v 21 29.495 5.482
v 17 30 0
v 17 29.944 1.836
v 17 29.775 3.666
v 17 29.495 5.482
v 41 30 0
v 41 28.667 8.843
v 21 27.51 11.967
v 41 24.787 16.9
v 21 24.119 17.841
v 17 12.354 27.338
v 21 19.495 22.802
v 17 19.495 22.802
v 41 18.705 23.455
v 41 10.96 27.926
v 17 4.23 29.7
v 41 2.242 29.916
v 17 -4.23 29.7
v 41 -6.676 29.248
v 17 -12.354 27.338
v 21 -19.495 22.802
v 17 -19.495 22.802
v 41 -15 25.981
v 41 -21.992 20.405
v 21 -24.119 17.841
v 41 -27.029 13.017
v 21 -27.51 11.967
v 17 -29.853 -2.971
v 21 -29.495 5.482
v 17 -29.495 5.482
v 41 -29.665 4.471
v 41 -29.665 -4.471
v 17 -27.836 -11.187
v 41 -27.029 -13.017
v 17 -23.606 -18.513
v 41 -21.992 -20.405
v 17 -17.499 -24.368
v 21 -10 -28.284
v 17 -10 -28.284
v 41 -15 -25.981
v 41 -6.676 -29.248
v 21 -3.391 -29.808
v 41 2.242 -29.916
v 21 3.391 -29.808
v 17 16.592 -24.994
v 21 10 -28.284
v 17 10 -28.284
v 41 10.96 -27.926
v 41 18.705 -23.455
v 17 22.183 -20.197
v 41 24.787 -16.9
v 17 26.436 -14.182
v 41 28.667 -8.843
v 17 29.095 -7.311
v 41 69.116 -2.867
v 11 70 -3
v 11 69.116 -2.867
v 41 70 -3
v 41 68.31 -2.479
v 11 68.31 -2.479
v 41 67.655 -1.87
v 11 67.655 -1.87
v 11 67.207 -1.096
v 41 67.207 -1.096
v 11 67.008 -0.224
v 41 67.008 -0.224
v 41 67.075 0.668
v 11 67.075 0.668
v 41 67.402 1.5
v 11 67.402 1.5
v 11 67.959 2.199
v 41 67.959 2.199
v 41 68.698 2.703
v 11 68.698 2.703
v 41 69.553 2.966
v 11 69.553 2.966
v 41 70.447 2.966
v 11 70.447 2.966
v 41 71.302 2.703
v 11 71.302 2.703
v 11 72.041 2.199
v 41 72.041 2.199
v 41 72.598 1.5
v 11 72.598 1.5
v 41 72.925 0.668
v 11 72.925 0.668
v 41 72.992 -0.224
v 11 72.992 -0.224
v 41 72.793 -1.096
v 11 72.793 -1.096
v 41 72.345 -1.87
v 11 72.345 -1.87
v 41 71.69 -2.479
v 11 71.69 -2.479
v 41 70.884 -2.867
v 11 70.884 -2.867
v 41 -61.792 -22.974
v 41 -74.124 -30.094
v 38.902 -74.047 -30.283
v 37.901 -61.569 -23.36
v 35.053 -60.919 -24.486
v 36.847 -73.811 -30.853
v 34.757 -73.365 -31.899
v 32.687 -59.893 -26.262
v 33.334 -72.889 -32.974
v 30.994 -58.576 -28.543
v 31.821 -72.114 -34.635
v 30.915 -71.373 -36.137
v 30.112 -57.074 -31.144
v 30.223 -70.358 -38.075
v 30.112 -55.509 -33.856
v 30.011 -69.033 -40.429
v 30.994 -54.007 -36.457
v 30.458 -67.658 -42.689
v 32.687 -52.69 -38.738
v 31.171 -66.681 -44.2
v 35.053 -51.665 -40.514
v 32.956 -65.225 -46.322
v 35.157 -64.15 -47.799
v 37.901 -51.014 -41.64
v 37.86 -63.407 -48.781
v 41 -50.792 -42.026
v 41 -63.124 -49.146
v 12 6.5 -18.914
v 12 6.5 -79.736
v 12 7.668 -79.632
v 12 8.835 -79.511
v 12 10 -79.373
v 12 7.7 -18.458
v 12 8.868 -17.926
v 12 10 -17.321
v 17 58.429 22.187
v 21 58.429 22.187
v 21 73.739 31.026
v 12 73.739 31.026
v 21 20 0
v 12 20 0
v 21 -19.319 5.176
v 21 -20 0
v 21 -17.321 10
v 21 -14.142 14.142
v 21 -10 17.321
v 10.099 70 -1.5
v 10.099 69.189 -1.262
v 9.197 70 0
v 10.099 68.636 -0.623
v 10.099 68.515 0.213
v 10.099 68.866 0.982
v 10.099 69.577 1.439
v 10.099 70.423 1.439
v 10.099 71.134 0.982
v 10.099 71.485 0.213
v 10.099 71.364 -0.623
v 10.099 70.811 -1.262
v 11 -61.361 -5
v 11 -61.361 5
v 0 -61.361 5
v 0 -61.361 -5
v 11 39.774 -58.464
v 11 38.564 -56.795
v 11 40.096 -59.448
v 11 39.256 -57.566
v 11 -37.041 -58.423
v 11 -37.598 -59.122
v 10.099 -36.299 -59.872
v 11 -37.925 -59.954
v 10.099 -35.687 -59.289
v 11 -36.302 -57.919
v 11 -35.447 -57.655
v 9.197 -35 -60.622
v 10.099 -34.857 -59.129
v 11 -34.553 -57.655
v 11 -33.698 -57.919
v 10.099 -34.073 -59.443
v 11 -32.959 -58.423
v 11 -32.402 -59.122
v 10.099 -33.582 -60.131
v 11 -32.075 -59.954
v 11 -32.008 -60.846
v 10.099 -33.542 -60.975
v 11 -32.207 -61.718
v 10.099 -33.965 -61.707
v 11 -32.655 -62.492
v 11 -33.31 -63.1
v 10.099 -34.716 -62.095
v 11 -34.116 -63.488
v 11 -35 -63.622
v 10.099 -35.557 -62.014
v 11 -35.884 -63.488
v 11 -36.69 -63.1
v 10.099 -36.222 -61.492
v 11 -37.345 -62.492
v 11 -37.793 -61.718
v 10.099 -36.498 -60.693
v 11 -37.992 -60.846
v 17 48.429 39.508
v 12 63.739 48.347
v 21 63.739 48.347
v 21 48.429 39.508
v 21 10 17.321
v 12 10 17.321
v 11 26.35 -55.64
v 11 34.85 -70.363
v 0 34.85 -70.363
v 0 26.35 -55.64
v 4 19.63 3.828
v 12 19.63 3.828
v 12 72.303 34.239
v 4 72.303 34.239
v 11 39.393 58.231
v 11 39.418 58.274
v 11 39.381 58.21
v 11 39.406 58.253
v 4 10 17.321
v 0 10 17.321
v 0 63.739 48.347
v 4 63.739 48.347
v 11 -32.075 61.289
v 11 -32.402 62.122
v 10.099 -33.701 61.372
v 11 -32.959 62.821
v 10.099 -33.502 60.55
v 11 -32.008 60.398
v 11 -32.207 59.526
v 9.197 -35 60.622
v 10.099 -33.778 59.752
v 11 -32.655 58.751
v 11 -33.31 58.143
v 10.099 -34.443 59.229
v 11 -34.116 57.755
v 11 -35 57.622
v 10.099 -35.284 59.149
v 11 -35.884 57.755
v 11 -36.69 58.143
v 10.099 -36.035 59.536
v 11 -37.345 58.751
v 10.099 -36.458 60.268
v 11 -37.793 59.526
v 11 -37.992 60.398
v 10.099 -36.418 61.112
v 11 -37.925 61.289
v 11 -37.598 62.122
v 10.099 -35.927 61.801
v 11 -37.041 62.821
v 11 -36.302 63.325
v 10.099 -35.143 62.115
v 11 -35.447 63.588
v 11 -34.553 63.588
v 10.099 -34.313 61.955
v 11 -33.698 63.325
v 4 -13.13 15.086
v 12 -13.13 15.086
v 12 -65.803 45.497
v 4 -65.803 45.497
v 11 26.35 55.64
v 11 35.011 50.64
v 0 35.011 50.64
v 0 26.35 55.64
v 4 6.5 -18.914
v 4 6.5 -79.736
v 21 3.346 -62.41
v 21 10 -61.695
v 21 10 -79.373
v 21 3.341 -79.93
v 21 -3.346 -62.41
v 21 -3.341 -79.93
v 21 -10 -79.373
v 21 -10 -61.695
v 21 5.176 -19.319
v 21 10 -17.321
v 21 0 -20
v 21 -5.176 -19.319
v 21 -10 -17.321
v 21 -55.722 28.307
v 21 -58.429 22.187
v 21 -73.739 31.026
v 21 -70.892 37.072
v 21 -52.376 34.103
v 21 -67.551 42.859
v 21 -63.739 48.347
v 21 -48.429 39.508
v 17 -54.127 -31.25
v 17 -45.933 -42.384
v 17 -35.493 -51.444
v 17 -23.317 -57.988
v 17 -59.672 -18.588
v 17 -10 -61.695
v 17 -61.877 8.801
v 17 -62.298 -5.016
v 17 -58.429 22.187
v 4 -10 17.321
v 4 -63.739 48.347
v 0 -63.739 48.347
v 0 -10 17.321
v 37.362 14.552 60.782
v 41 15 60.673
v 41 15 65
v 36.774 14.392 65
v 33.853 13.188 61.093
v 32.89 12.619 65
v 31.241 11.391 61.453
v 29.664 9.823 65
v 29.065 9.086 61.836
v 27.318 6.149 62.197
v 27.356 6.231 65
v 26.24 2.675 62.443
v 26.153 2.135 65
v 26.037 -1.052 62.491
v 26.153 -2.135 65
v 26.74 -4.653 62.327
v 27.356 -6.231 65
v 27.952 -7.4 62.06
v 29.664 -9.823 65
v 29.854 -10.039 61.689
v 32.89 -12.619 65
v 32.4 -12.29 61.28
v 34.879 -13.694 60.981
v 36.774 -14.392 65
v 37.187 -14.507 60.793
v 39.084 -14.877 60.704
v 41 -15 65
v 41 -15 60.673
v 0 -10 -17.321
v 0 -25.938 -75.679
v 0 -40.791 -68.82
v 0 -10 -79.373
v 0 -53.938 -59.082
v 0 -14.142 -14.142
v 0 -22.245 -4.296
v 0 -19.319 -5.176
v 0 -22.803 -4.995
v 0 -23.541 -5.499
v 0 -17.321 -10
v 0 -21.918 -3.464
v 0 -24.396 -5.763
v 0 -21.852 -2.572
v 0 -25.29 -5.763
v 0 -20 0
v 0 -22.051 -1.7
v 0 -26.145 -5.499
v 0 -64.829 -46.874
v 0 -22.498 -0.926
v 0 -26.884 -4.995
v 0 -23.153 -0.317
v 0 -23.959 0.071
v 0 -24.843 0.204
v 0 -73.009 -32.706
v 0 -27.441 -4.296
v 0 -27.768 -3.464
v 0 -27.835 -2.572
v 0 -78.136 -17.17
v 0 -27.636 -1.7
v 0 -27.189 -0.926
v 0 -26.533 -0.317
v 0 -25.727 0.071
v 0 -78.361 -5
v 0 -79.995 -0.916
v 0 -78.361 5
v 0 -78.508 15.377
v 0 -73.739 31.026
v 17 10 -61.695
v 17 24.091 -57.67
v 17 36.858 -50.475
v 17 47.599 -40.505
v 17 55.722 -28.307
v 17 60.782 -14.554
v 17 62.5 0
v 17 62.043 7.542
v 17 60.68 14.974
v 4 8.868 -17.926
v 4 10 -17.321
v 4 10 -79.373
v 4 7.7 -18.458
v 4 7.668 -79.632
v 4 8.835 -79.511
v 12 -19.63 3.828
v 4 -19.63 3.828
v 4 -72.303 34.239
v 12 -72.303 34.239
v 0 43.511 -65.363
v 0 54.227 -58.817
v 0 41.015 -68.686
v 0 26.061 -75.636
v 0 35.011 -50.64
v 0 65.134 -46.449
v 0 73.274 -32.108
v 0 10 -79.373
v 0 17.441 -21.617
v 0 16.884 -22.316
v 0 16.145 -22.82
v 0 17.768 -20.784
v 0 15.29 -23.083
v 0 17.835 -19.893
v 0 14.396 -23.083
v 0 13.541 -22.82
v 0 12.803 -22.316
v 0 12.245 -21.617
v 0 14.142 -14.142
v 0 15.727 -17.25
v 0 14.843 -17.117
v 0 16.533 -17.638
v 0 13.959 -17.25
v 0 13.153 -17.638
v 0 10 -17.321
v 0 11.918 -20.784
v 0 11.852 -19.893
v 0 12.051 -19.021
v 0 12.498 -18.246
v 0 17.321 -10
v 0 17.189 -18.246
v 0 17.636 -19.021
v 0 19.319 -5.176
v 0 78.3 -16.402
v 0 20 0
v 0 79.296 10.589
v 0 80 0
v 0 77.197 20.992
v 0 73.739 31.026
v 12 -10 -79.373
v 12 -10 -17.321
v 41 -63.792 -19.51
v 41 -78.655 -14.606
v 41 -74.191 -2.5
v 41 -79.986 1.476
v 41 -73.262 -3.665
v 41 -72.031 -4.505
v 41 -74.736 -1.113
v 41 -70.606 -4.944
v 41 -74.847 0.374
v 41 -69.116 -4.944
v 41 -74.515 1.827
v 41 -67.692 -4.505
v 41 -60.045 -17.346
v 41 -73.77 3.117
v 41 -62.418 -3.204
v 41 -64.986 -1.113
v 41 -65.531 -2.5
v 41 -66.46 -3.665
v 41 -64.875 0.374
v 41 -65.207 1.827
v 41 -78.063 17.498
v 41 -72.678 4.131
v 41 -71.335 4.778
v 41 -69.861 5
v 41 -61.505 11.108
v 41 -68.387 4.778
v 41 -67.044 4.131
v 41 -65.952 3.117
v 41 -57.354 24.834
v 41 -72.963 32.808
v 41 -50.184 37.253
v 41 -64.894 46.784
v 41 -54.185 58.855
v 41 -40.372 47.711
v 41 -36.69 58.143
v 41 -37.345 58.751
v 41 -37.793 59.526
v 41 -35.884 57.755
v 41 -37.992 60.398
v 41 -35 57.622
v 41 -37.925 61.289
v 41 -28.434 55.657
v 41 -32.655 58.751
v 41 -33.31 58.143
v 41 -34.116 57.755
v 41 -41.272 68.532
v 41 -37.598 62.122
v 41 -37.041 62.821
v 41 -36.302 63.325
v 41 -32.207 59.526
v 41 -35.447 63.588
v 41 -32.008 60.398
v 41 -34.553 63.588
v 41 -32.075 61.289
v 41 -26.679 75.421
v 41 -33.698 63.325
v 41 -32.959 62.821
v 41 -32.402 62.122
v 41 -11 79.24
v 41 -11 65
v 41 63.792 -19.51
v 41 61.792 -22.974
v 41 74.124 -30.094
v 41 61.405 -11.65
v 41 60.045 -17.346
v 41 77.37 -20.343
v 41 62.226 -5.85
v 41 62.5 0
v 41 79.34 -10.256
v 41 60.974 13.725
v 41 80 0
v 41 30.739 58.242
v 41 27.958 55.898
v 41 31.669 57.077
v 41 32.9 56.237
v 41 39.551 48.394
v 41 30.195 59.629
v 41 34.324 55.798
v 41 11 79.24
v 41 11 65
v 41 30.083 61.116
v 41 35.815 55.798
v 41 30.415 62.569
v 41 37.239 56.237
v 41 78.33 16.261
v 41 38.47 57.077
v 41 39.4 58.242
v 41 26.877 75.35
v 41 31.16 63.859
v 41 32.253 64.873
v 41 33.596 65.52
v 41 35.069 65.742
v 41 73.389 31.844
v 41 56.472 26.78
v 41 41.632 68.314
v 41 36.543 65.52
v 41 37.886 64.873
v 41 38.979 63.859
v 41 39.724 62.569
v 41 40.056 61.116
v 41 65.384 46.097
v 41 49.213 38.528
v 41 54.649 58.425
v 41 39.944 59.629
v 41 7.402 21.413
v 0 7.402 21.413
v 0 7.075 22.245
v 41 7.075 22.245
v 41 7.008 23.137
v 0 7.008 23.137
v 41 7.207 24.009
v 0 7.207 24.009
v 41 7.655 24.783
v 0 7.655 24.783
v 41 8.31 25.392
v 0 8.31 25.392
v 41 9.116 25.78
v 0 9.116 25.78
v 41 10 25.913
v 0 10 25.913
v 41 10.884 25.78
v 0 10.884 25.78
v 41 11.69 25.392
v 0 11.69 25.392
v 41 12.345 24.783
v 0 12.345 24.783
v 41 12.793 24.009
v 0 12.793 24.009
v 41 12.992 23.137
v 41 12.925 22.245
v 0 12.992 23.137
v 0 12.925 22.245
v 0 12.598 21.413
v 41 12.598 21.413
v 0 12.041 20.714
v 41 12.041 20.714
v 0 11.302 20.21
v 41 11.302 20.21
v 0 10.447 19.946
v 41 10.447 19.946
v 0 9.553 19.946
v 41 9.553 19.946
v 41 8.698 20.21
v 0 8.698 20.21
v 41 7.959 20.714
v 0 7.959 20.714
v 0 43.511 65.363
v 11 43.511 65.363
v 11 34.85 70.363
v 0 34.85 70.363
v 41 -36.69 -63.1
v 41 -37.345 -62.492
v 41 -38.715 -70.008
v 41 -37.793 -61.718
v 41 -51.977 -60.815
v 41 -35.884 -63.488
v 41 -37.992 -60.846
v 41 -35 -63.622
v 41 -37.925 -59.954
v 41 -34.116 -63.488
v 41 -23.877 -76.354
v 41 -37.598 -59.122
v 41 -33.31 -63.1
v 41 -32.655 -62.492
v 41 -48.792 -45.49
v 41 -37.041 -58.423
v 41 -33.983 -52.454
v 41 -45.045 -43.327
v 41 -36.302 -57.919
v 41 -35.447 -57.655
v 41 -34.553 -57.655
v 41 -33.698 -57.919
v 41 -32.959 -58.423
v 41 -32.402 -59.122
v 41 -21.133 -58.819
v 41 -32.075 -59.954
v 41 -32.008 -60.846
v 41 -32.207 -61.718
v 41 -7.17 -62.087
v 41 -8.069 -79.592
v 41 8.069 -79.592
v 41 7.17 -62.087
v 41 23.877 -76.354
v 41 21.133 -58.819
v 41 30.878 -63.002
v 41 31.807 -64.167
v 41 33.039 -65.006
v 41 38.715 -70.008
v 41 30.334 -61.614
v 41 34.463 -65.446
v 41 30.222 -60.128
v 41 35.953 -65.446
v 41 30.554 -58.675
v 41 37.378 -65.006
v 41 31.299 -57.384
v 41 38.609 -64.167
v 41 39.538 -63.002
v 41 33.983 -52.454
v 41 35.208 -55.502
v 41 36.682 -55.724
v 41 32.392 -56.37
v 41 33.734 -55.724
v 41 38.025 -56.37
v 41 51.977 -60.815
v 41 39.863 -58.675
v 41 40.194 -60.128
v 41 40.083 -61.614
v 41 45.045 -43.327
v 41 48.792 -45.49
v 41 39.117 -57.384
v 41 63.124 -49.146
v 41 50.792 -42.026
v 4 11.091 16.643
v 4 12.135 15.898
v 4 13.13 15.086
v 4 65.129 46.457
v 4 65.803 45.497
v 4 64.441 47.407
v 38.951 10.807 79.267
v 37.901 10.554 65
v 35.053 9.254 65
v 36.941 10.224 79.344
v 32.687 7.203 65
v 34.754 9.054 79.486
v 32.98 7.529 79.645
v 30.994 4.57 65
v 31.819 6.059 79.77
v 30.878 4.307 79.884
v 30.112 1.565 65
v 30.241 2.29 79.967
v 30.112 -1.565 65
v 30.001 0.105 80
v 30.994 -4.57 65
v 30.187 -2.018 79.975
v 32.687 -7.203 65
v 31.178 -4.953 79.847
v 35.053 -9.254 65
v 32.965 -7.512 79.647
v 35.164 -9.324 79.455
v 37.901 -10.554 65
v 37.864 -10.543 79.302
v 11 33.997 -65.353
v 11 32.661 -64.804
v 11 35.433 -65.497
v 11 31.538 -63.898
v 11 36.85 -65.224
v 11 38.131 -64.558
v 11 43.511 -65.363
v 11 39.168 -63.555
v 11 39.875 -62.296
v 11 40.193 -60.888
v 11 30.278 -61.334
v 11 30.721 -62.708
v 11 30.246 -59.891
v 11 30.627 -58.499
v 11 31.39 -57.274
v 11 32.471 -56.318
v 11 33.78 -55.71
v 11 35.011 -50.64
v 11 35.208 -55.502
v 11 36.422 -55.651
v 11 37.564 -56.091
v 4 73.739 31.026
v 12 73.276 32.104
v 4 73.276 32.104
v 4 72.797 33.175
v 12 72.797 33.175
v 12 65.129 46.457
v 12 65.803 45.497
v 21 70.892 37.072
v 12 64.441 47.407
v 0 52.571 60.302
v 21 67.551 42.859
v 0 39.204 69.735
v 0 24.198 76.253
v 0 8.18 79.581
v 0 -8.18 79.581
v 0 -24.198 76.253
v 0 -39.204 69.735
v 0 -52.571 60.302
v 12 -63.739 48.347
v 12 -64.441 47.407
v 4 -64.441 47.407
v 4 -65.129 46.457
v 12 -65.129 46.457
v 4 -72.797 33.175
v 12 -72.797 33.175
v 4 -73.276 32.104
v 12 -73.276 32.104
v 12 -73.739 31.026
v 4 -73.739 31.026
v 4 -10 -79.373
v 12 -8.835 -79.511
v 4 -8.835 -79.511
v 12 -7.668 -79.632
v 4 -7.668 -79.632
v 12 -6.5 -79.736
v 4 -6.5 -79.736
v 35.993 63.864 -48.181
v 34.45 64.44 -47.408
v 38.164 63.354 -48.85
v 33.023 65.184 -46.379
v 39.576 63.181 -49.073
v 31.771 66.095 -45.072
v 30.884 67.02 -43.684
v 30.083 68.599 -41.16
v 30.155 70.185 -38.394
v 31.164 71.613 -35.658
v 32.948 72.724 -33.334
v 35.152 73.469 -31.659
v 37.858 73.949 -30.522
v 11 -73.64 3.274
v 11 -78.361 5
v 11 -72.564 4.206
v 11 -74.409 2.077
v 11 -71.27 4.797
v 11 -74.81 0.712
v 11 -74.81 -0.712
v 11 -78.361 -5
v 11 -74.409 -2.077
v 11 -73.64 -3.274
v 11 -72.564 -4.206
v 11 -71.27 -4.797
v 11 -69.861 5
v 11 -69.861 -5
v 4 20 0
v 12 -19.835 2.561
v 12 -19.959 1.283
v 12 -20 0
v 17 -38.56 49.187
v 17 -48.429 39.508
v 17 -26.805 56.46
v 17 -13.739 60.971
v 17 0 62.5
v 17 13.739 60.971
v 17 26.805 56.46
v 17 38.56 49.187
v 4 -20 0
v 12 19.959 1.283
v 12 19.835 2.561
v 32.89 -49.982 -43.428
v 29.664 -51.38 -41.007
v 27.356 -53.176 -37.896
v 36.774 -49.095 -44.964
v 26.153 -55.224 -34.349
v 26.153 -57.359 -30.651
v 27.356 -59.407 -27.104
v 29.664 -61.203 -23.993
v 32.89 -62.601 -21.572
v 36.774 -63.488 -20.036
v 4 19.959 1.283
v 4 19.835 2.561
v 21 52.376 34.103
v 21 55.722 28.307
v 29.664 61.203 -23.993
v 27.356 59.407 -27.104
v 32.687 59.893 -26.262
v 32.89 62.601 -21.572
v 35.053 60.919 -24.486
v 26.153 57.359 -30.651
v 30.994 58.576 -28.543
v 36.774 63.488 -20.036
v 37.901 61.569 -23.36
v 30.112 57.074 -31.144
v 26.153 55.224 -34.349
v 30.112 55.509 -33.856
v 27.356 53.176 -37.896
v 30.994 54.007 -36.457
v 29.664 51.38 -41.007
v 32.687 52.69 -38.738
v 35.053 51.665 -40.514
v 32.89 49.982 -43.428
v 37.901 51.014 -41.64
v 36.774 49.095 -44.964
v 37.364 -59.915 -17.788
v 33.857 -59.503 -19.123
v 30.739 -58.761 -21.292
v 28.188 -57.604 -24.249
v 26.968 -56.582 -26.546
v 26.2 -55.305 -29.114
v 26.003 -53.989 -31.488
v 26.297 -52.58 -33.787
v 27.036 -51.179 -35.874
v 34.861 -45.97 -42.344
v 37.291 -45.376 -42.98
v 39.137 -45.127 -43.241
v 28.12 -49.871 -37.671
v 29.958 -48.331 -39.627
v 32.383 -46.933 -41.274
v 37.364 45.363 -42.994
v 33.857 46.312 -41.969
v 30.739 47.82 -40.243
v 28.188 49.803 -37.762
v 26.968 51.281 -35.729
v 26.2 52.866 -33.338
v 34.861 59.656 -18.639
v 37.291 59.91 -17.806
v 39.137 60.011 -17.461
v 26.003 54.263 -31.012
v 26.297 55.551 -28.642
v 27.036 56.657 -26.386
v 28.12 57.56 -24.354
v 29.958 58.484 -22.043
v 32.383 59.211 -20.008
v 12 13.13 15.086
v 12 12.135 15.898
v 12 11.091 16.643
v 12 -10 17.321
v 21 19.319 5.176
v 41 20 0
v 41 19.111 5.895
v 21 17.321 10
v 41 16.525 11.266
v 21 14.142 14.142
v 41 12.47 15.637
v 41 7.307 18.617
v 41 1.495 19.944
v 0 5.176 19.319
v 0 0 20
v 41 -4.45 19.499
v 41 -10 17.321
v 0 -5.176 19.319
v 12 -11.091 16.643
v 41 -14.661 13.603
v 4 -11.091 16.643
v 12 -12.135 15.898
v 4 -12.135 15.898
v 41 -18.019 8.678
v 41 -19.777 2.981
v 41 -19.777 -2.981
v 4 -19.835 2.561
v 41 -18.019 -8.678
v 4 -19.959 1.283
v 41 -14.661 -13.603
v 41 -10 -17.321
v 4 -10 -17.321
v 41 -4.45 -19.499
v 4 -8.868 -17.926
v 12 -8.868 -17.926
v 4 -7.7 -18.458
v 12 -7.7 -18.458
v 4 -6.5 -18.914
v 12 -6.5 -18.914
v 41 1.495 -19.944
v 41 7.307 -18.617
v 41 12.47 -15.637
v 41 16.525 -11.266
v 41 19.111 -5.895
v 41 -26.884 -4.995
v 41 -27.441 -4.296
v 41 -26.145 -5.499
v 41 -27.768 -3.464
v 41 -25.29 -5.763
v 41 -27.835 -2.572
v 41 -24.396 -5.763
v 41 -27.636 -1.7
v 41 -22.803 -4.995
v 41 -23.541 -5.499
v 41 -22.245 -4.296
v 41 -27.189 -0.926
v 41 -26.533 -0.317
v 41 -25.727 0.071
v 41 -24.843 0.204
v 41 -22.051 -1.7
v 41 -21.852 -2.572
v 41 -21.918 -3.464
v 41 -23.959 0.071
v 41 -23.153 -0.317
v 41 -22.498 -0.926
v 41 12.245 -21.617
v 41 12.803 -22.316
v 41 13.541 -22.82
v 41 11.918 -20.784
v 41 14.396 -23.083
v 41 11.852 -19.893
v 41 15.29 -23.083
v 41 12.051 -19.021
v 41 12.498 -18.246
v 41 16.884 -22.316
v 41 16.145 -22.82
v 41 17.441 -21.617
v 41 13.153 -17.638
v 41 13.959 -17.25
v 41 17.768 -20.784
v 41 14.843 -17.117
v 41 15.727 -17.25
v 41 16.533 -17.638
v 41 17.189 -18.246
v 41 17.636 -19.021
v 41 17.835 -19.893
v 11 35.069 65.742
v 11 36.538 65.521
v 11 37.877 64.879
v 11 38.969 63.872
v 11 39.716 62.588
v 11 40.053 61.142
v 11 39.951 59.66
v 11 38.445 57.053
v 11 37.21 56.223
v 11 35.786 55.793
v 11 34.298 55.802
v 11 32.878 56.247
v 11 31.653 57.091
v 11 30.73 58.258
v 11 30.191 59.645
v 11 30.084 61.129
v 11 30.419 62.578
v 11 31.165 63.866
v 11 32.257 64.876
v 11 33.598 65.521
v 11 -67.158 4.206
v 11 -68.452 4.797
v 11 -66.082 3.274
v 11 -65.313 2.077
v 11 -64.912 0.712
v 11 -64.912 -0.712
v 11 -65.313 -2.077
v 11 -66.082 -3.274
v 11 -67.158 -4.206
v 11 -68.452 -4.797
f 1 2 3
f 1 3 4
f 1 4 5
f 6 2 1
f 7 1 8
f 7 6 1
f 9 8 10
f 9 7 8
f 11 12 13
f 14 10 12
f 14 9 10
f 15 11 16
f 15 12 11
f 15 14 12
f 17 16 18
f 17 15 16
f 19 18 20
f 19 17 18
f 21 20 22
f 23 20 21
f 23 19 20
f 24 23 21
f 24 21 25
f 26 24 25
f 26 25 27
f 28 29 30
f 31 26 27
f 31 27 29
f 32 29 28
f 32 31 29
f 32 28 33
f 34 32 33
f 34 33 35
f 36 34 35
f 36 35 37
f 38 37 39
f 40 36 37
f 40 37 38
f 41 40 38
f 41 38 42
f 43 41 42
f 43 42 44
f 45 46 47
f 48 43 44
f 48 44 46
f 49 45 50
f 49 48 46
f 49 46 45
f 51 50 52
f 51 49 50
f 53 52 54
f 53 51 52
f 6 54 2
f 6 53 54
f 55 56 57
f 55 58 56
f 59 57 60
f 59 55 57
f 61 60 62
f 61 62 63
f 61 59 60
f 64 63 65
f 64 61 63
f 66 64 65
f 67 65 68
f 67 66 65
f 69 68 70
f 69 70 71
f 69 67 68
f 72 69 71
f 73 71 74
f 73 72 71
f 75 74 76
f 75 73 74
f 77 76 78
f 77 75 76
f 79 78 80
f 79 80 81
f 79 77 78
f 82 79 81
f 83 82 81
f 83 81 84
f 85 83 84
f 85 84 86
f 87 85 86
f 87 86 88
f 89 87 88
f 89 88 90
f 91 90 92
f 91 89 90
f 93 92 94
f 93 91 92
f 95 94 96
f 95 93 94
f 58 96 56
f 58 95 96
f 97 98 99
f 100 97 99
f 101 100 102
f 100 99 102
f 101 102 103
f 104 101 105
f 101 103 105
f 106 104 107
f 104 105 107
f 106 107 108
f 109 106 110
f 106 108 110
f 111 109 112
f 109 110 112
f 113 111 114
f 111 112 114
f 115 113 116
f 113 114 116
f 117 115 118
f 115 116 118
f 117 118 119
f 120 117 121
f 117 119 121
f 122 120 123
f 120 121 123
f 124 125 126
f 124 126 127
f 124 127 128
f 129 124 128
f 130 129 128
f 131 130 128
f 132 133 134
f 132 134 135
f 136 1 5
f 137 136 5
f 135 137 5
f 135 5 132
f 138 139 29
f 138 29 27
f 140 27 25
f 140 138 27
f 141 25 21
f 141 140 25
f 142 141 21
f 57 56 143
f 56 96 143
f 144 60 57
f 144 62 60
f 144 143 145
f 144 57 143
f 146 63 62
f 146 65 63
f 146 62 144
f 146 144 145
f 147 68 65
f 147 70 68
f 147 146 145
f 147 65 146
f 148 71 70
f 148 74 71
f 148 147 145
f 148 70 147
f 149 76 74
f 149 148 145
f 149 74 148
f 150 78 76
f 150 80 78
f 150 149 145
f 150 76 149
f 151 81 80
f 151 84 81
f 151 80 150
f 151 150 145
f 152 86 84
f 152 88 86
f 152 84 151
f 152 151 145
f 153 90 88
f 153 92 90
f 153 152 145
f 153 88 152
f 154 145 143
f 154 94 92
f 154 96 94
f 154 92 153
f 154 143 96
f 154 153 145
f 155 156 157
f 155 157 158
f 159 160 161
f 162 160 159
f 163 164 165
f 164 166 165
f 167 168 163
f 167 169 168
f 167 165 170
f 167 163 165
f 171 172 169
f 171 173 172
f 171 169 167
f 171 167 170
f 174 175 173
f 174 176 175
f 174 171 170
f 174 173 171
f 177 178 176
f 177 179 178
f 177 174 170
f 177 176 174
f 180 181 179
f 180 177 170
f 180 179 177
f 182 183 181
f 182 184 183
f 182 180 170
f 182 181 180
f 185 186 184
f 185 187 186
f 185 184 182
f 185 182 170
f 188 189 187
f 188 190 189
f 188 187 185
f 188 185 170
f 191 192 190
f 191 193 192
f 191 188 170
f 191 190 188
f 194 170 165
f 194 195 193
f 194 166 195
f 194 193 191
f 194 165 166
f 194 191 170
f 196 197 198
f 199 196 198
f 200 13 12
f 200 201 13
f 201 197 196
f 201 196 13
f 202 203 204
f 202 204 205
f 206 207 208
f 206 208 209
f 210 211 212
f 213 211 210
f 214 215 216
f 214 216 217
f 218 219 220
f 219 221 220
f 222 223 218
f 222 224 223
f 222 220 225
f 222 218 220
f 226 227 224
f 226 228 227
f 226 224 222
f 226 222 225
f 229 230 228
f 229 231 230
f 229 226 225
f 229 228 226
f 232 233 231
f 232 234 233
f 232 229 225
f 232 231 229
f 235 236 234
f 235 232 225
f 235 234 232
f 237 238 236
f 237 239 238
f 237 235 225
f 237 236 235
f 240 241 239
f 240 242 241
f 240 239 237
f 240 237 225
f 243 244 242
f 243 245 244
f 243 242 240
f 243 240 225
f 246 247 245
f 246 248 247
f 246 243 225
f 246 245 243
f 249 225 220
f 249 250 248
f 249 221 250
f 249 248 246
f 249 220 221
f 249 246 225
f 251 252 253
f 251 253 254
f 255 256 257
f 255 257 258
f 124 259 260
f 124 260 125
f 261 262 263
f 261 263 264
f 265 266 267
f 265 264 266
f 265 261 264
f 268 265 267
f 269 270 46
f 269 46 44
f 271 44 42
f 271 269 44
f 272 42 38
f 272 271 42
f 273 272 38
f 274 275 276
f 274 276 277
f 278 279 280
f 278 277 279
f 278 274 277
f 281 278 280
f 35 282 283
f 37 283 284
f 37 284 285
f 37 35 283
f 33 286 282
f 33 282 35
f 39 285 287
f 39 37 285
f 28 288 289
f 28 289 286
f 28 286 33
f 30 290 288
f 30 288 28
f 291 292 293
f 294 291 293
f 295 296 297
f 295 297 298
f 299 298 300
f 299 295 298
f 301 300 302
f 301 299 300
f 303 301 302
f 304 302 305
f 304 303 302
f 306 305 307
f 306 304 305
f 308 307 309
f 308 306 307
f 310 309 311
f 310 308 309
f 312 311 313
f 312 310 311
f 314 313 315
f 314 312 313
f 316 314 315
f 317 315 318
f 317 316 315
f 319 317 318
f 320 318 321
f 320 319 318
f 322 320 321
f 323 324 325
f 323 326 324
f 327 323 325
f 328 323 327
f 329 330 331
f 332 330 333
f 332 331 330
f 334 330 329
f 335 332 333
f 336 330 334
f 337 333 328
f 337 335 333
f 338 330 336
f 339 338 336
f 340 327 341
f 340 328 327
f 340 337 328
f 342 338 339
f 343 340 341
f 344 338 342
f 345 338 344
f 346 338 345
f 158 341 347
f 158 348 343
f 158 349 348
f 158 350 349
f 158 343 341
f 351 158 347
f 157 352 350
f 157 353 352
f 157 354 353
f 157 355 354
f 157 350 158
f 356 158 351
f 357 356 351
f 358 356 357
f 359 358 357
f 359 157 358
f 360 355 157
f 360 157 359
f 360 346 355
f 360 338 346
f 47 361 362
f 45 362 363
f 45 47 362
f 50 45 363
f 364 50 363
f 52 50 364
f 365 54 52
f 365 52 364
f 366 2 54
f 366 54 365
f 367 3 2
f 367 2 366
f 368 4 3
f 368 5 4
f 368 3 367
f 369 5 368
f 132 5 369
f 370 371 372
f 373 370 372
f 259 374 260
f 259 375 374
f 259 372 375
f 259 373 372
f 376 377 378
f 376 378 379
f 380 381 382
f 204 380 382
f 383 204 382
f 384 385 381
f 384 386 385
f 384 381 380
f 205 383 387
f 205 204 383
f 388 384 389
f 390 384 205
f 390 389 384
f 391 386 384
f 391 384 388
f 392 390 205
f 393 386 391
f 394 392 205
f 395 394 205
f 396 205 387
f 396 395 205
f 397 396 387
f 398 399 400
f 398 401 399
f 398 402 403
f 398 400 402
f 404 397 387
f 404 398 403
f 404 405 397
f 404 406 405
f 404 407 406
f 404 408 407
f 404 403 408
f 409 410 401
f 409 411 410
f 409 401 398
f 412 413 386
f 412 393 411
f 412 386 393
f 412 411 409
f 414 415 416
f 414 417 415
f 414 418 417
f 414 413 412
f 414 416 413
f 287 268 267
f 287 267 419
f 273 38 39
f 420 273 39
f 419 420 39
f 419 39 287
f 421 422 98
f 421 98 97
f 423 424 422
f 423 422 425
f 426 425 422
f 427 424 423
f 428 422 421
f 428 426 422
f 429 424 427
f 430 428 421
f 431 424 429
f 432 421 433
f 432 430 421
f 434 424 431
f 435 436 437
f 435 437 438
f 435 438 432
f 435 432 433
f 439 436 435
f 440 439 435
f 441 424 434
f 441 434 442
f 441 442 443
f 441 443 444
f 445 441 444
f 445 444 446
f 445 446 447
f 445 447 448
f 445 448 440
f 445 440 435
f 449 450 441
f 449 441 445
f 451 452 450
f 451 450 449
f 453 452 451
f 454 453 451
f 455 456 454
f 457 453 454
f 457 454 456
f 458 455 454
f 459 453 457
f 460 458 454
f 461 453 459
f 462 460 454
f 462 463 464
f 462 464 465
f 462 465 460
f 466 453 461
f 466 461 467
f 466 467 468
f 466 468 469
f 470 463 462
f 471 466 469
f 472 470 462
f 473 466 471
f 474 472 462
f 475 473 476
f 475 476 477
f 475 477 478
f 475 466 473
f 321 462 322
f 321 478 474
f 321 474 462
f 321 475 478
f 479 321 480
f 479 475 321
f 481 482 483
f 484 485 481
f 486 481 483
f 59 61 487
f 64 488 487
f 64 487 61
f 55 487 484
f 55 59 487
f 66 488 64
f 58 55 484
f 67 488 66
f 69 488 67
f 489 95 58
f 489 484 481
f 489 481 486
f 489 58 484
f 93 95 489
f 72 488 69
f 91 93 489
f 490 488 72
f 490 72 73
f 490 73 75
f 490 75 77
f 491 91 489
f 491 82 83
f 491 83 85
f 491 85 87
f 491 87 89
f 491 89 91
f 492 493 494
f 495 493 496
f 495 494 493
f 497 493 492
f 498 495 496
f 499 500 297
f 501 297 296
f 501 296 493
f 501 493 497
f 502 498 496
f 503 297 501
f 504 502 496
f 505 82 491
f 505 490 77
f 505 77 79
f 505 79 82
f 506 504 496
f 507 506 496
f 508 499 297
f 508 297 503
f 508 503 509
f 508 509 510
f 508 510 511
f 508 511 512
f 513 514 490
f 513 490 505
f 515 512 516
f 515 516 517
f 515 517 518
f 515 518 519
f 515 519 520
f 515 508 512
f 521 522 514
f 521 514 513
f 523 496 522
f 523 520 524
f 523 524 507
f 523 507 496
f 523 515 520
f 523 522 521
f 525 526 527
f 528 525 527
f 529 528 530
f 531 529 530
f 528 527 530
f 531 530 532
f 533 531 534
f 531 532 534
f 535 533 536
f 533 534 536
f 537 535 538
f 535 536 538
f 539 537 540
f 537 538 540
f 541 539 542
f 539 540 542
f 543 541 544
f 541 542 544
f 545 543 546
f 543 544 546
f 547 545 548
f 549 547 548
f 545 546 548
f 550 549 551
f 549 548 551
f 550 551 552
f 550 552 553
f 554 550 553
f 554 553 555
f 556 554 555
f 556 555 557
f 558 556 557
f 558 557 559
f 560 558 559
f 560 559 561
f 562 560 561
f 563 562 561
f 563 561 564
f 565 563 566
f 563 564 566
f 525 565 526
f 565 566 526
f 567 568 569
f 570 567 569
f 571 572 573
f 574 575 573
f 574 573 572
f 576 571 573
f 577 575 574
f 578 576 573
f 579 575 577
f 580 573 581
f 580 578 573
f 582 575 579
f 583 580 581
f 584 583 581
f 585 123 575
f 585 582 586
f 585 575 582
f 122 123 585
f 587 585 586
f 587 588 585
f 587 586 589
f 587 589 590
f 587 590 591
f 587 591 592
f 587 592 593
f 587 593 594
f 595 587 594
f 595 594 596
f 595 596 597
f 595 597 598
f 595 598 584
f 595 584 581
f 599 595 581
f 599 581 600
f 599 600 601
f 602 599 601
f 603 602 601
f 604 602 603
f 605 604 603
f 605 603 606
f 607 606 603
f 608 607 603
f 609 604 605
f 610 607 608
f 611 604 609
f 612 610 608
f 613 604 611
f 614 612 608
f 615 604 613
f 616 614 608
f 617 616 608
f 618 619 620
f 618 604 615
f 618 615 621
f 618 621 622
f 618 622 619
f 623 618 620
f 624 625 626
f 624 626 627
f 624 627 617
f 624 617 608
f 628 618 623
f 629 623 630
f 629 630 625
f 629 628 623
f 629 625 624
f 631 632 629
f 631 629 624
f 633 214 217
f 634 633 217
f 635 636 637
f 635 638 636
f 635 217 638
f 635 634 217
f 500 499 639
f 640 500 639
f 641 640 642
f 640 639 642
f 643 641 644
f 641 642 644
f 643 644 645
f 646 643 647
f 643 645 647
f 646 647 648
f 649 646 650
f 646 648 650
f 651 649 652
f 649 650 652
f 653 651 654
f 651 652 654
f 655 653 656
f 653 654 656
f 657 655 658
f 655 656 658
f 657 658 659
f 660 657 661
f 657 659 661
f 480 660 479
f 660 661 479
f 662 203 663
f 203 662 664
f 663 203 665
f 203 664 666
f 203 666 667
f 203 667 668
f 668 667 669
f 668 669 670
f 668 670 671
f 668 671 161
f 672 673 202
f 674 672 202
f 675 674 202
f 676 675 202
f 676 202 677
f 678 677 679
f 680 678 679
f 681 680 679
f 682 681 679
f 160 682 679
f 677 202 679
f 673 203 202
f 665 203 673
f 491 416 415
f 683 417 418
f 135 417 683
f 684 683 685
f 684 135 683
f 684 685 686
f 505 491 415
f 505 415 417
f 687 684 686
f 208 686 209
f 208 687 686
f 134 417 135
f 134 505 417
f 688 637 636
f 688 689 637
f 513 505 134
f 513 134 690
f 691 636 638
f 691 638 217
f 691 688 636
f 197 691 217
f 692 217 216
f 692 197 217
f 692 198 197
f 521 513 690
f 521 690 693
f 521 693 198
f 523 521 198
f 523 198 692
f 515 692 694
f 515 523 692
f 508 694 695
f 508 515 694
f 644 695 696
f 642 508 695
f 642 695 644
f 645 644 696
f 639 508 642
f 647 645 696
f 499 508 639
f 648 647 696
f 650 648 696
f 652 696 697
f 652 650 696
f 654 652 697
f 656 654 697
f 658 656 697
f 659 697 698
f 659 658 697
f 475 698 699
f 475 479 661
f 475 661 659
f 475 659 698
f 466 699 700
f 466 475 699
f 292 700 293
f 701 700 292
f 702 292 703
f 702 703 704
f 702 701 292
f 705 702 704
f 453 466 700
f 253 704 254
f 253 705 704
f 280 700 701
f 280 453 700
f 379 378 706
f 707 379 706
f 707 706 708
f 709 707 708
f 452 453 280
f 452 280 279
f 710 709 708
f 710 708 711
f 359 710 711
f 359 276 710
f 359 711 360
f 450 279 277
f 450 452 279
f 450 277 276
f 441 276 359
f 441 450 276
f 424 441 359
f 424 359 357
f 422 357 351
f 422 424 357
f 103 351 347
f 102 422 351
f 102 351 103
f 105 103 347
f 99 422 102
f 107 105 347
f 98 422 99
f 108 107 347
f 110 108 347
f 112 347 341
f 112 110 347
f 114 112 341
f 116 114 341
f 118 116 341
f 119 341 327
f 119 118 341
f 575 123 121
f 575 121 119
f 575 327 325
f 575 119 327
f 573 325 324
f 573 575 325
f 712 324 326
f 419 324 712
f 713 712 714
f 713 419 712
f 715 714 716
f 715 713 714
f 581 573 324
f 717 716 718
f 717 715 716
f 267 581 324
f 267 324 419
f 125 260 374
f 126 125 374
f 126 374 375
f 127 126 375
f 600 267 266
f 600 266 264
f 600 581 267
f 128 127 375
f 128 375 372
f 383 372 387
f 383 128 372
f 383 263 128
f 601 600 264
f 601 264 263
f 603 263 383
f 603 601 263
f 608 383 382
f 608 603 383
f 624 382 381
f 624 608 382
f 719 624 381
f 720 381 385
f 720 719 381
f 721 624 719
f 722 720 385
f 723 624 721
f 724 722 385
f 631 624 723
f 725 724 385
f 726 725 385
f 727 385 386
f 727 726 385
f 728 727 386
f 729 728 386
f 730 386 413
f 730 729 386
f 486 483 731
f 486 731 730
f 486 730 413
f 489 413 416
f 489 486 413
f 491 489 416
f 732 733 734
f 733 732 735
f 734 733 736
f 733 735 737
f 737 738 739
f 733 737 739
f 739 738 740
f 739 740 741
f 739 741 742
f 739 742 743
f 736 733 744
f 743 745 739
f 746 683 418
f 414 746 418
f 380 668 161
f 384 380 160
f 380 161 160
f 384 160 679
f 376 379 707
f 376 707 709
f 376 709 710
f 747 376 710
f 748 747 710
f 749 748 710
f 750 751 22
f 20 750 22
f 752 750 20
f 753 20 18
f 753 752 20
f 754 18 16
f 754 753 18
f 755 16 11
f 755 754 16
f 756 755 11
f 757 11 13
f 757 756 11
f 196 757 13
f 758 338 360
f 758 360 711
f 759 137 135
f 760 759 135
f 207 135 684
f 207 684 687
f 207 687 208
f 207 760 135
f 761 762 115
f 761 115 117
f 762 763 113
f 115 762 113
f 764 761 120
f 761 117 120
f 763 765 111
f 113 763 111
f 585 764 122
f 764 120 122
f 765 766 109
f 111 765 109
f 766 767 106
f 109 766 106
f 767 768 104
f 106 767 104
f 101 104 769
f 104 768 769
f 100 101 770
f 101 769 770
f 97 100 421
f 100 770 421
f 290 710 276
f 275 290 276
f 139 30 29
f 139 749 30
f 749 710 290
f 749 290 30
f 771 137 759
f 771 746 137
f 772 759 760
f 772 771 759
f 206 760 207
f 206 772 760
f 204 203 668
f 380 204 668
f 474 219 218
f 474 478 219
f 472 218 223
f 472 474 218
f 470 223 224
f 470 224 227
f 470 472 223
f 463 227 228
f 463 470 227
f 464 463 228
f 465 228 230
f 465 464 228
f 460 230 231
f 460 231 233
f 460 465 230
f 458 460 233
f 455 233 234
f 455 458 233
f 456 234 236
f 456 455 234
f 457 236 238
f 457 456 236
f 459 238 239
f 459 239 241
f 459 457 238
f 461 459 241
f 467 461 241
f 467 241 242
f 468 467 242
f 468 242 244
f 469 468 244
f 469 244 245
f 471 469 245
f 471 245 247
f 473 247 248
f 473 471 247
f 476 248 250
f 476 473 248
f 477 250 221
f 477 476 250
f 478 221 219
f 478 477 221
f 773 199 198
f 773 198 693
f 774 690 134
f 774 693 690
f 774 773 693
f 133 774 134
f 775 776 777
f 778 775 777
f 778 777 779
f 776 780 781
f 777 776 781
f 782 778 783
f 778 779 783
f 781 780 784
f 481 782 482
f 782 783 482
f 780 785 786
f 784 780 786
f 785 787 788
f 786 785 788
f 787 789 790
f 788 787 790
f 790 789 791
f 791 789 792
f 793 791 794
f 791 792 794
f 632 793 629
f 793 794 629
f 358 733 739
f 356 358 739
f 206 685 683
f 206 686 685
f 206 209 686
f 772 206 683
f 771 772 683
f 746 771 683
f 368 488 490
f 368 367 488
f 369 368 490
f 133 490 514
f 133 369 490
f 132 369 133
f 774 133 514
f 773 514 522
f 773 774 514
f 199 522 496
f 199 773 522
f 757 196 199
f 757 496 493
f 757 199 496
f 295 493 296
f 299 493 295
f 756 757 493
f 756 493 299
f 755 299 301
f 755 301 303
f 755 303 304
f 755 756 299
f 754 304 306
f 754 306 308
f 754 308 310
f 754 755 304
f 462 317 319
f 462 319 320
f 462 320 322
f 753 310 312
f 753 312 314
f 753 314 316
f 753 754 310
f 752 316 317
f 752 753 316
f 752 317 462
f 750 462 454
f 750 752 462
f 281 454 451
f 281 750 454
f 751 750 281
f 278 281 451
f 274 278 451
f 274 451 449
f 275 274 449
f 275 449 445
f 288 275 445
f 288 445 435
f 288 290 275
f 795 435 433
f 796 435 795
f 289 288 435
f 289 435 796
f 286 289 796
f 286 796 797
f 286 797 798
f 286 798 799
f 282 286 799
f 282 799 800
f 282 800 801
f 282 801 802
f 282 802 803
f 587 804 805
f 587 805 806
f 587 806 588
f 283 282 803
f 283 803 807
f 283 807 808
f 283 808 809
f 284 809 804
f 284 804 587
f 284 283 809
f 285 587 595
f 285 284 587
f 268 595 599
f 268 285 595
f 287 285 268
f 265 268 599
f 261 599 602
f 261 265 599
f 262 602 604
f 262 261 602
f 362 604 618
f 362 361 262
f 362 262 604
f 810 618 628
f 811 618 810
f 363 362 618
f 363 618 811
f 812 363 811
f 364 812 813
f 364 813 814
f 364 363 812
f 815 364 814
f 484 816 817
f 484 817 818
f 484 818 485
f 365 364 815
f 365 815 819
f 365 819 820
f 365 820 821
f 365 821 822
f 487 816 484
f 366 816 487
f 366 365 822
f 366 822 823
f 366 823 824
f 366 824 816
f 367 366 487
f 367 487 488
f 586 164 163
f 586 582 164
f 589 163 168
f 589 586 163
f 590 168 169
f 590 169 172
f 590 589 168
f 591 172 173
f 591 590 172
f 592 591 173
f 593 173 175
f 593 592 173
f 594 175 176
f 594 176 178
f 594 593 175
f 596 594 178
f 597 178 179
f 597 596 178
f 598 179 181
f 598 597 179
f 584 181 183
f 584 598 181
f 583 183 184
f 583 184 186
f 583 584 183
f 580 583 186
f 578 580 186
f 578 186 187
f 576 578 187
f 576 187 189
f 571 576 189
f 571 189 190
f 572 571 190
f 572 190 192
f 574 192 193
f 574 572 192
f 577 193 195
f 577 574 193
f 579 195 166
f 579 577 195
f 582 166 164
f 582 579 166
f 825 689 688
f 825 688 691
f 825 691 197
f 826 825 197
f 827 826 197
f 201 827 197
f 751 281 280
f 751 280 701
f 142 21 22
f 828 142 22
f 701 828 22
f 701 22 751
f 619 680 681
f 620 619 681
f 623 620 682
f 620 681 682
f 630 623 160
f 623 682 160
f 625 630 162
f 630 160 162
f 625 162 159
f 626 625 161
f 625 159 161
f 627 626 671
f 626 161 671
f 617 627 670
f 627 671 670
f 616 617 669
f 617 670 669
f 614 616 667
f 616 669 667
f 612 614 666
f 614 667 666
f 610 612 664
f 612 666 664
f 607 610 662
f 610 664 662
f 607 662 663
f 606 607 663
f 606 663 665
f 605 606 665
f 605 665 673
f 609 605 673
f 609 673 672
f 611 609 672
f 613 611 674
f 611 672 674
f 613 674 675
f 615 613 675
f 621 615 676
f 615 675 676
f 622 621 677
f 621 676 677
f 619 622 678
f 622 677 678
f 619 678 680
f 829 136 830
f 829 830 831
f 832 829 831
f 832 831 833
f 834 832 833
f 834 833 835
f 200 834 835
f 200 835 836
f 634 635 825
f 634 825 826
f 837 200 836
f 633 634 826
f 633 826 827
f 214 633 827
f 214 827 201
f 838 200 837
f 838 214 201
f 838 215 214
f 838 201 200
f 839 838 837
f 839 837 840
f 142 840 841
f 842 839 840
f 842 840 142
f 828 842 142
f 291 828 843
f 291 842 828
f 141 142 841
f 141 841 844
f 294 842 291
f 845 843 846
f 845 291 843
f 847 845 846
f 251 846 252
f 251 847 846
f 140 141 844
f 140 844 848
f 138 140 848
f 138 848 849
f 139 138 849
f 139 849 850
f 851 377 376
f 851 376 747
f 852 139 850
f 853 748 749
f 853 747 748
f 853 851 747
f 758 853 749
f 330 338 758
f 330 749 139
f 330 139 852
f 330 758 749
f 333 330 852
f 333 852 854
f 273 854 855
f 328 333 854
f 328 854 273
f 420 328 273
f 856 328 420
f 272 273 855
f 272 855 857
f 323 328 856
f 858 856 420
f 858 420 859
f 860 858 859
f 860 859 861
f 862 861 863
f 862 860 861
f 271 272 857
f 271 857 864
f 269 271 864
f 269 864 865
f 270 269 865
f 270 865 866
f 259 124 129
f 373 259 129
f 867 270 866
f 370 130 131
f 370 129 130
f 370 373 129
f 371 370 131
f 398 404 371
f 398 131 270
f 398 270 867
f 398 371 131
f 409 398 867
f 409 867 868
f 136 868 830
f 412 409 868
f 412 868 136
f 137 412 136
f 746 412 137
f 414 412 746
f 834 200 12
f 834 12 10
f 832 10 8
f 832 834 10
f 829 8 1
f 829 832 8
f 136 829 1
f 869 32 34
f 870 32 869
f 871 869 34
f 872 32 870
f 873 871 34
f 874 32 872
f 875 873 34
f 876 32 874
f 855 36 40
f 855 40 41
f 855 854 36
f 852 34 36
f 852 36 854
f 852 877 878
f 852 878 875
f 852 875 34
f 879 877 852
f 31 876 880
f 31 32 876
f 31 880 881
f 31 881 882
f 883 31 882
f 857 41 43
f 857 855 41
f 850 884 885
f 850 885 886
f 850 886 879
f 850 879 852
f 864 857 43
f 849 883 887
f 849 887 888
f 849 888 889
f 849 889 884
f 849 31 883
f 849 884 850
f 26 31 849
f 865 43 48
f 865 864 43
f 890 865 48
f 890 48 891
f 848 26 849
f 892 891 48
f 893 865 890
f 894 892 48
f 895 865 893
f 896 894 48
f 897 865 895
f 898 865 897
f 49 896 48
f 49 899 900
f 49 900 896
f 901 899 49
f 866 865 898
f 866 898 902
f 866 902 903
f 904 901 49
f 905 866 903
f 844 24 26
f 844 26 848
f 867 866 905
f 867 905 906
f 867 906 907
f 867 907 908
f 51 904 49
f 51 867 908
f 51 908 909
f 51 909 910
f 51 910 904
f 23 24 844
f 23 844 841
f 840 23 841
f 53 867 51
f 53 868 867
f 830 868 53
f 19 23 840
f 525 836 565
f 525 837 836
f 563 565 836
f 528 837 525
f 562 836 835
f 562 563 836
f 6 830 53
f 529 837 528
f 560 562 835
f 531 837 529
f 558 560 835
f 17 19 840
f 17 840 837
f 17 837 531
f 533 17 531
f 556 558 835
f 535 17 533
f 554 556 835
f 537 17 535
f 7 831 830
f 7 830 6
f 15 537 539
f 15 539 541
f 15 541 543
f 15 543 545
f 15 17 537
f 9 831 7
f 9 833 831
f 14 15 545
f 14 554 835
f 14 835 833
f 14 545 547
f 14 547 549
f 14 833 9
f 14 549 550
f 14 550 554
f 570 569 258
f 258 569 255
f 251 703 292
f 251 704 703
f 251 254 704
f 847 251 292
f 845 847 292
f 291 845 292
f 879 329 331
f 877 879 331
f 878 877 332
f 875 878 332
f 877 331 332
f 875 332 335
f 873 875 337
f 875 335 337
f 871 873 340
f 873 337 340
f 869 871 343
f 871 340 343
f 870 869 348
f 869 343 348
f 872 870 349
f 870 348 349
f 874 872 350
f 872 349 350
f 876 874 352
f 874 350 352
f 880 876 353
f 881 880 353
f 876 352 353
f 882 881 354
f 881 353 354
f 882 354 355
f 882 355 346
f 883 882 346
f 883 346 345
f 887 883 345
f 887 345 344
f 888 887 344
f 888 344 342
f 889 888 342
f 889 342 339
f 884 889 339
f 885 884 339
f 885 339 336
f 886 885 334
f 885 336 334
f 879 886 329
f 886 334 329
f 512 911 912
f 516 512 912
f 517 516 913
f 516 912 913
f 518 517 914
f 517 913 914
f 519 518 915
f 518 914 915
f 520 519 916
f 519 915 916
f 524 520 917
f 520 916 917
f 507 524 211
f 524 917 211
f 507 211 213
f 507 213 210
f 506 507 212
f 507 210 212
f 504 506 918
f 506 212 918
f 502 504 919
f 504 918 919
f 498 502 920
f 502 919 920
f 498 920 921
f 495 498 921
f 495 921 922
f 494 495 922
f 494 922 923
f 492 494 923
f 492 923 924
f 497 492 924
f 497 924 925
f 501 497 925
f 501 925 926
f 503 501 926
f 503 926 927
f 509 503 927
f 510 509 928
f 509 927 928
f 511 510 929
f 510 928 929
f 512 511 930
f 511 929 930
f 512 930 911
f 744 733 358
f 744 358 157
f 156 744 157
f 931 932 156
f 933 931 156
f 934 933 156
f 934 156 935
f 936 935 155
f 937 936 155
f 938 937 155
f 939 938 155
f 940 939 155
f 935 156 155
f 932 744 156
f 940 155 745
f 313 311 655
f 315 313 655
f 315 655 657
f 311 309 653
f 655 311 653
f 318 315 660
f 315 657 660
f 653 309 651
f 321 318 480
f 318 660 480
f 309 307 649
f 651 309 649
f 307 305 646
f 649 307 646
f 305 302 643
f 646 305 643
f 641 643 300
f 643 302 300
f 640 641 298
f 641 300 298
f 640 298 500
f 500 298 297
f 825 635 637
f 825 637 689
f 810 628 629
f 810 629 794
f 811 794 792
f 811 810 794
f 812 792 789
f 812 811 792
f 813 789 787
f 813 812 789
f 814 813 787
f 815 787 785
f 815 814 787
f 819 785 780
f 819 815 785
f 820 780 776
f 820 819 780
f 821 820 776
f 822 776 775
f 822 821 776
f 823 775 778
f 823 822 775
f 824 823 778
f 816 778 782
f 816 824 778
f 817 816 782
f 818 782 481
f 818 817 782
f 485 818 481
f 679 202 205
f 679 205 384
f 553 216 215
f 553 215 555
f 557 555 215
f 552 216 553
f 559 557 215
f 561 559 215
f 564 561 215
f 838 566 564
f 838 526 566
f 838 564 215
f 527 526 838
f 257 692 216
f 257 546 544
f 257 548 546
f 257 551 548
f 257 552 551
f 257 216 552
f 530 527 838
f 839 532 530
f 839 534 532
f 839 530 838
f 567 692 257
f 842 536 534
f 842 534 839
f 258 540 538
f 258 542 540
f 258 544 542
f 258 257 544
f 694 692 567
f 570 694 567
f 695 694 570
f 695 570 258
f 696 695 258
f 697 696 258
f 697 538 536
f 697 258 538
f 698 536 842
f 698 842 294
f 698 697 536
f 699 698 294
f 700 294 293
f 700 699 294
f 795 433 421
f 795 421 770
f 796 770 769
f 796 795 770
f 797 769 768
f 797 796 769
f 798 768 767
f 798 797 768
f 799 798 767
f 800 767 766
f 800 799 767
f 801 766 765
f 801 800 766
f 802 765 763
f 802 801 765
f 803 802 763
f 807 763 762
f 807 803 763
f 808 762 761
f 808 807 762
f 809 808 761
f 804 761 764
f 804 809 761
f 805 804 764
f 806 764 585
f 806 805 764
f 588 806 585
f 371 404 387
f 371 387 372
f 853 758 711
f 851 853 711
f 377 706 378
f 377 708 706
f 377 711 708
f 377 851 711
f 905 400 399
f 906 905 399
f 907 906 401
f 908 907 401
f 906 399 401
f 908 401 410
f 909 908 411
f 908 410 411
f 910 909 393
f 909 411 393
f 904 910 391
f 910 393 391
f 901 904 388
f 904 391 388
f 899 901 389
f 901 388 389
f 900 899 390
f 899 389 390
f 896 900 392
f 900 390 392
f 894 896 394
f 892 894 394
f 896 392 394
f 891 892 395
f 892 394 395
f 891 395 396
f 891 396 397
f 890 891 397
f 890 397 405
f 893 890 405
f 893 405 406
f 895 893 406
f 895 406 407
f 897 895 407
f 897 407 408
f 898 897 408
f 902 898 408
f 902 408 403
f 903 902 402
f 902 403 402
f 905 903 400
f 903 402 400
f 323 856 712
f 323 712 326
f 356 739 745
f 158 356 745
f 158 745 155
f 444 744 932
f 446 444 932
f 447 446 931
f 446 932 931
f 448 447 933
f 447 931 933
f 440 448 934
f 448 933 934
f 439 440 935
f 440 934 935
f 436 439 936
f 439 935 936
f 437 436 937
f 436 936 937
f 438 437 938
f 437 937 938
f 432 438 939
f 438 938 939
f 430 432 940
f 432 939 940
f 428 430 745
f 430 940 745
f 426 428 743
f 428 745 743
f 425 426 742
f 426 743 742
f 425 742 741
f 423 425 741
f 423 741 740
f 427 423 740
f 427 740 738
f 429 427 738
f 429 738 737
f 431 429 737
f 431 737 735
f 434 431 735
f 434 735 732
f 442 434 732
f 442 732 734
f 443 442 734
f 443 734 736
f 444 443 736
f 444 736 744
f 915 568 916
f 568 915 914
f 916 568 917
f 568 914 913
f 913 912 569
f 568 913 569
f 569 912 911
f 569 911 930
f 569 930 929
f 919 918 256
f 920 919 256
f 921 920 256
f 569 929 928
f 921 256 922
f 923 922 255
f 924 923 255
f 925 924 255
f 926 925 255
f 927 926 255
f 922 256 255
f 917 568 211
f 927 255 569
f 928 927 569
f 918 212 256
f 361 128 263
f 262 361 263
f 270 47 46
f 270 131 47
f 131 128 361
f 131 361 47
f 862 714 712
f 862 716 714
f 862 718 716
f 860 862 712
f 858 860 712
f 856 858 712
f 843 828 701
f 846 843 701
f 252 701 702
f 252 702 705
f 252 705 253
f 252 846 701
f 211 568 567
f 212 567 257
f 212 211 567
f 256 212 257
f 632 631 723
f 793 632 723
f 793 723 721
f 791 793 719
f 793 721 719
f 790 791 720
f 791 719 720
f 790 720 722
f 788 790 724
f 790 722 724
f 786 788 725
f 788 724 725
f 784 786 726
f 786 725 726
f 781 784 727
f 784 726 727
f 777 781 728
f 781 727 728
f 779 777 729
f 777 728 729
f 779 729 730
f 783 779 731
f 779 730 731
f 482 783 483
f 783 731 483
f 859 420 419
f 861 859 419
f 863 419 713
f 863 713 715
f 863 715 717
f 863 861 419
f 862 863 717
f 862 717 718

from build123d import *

# Parameters (mm, degrees)
CUT_EXTRUDE1_DEPTH = 81
CIRPATTERN1_COUNT  = 3
CUT_EXTRUDE2_START = -11
SKETCH5_R          = 5
CUT_EXTRUDE2_DEPTH = 30
SKETCH9_R          = 2.999999999
CUT_EXTRUDE3_DEPTH = 41
CIRPATTERN3_COUNT  = 3
SKETCH11_R         = 11
CUT_EXTRUDE4_DEPTH = 15
CUT_EXTRUDE5_START = -4.326695
SKETCH12_R         = 15
CUT_EXTRUDE5_DEPTH = 4.326695
SKETCH15_W         = 10
SKETCH15_H         = 17
CUT_EXTRUDE9_DEPTH = 15
CIRPATTERN5_COUNT  = 3
CIRPATTERN7_COUNT  = 3
CIRPATTERN8_COUNT  = 3


with BuildPart() as part:
    # Sketch1 → Revolve1 (revolve)
    with BuildSketch(Plane.XY):
        Polygon((0, 20), (0, 80), (41, 80), (41, 62.5), (17, 62.5), (17, 30), (41, 30), (41, 20), align=None)
    revolve(axis=Axis((-1000, 0, 0), (1, 0, 0)))

    # Sketch3 → Cut-Extrude1 (cut, through all)
    with BuildSketch(Plane.XY):
        Polygon((0, -10), (0, 10), (4, 10), (4, 6.5), (12, 6.5), (12, 10), (21, 10), (21, -10), (12, -10), (12, -6.5), (4, -6.5), (4, -10), align=None)
    cut_extrude1 = extrude(amount=-CUT_EXTRUDE1_DEPTH, mode=Mode.SUBTRACT)

    # CirPattern1: Cut-Extrude1 ×3 about axis
    cirpattern1_axis = Axis((0, 0, 0), (1, 0, 0))
    for i in range(1, CIRPATTERN1_COUNT):
        add(cut_extrude1.rotate(cirpattern1_axis, i * 360 / CIRPATTERN1_COUNT), mode=Mode.SUBTRACT)

    # Sketch5 → Cut-Extrude2 (cut)
    with BuildSketch(Plane.ZY.offset(CUT_EXTRUDE2_START)):
        with Locations((0, -69.861084208)):
            Circle(SKETCH5_R)
        with Locations((-60.501612866, 35.208201697)):
            Circle(SKETCH5_R)
        with Locations((60.741864319, 35.069492456)):
            Circle(SKETCH5_R)
    extrude(amount=-CUT_EXTRUDE2_DEPTH, mode=Mode.SUBTRACT)

    # Sketch9 → Cut-Extrude3 (cut)
    with BuildSketch(Plane.ZY):
        with Locations((-20.116693275, 14.843134833)):
            Circle(SKETCH9_R)
    cut_extrude3 = extrude(amount=-CUT_EXTRUDE3_DEPTH, mode=Mode.SUBTRACT)

    # CirPattern3: Cut-Extrude3 ×3 about axis
    cirpattern3_axis = Axis((0, 0, 0), (1, 0, 0))
    for i in range(1, CIRPATTERN3_COUNT):
        add(cut_extrude3.rotate(cirpattern3_axis, i * 360 / CIRPATTERN3_COUNT), mode=Mode.SUBTRACT)

    # Sketch11 → Cut-Extrude4 (cut)
    with BuildSketch(Plane.XY.offset(80)):
        with Locations((41, 0)):
            Circle(SKETCH11_R)
    cut_extrude4 = extrude(amount=-CUT_EXTRUDE4_DEPTH, mode=Mode.SUBTRACT)

    # Sketch12 → Cut-Extrude5 (cut)
    with BuildSketch(Plane.XY.offset(65).offset(CUT_EXTRUDE5_START)):
        with Locations((41, 0)):
            Circle(SKETCH12_R)
    cut_extrude5 = extrude(amount=CUT_EXTRUDE5_DEPTH, mode=Mode.SUBTRACT)

    # Sketch15 → Cut-Extrude9 (cut)
    with BuildSketch(Plane(origin=(11, 0, 0), x_dir=(0, 0, -1), z_dir=(1, 0, 0))):
        with Locations((0, -69.861084208)):
            Rectangle(SKETCH15_W, SKETCH15_H)
    cut_extrude9 = extrude(amount=-CUT_EXTRUDE9_DEPTH, mode=Mode.SUBTRACT)

    # CirPattern5: Cut-Extrude9 ×3 about axis
    cirpattern5_axis = Axis((0, 0, 0), (1, 0, 0))
    for i in range(1, CIRPATTERN5_COUNT):
        add(cut_extrude9.rotate(cirpattern5_axis, i * 360 / CIRPATTERN5_COUNT), mode=Mode.SUBTRACT)

    # Sketch19 → Ø6.0mm Dowel Hole3 (revolve, cut)
    with BuildSketch(Plane(origin=(41, 70, 0), x_dir=(0, 0, -1), z_dir=(0, 1, 0))):
        Polygon((0, 0), (0, 31.802581857), (3, 30), (3, 0), align=None)
    f_6_0mm_dowel_hole3 = revolve(axis=Axis((47.35, 70, 0), (-1, 0, 0)), mode=Mode.SUBTRACT)

    # CirPattern7: Ø6.0mm Dowel Hole3 ×3 about axis
    cirpattern7_axis = Axis((0, 0, 0), (1, 0, 0))
    for i in range(1, CIRPATTERN7_COUNT):
        add(f_6_0mm_dowel_hole3.rotate(cirpattern7_axis, i * 360 / CIRPATTERN7_COUNT), mode=Mode.SUBTRACT)

    # CirPattern8: Cut-Extrude4, Cut-Extrude5 ×3 about axis
    cirpattern8_axis = Axis((0, 0, 0), (1, 0, 0))
    for i in range(1, CIRPATTERN8_COUNT):
        add(cut_extrude4.rotate(cirpattern8_axis, i * 360 / CIRPATTERN8_COUNT), mode=Mode.SUBTRACT)
        add(cut_extrude5.rotate(cirpattern8_axis, i * 360 / CIRPATTERN8_COUNT), mode=Mode.SUBTRACT)


solid = part.part
